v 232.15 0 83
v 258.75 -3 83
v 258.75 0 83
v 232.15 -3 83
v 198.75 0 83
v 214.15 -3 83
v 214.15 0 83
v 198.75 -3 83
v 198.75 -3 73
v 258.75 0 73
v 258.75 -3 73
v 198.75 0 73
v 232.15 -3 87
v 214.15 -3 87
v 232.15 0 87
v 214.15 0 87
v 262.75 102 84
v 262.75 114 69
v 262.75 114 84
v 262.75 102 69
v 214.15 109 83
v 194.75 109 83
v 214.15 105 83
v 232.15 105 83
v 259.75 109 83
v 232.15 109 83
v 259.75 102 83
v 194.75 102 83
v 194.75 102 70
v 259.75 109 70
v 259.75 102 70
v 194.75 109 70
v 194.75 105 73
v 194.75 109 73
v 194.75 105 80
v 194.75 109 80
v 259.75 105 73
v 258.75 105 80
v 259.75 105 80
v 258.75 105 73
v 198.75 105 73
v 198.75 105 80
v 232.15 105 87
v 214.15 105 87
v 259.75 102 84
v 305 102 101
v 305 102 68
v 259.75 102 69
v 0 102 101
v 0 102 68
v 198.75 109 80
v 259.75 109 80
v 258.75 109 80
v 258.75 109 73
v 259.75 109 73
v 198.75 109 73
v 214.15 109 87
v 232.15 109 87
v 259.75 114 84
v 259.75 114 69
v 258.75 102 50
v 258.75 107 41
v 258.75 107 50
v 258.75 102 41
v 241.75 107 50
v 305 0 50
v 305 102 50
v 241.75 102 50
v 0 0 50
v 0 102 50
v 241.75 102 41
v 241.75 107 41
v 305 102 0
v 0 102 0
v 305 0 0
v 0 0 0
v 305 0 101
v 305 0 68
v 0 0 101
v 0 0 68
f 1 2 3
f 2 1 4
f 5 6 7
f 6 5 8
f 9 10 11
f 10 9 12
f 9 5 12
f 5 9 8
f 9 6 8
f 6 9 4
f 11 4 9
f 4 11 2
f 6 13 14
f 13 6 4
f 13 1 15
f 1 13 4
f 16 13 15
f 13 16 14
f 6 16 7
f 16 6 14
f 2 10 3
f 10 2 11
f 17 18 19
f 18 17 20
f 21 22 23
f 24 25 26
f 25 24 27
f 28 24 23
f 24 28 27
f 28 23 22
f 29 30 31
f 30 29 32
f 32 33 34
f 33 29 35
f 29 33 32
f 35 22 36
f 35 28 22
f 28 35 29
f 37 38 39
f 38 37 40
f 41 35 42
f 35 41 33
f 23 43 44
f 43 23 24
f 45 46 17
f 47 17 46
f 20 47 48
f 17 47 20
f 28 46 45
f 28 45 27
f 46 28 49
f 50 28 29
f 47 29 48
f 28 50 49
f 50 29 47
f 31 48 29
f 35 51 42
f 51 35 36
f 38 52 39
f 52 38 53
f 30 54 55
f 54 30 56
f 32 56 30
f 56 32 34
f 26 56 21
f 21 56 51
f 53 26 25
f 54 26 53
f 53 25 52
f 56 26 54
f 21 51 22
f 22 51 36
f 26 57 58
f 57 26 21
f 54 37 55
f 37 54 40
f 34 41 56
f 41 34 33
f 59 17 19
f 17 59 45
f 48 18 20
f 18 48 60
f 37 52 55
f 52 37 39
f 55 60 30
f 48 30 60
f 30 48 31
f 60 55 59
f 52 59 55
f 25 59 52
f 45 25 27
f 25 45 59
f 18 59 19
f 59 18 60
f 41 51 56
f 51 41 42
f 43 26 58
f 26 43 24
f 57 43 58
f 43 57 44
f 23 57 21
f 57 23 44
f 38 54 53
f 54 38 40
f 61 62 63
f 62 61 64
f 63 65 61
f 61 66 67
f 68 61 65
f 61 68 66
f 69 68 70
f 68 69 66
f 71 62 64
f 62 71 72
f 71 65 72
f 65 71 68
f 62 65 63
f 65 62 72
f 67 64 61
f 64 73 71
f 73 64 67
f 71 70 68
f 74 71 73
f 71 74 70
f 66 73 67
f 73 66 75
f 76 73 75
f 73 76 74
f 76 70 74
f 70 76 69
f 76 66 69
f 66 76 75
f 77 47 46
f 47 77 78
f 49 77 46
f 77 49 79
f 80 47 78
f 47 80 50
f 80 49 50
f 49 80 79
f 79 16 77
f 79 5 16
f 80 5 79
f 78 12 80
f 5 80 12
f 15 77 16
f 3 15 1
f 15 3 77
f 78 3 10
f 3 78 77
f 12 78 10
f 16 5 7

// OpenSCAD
// 05_slide_to_lock_bar.scad
// Slide-to-lock cross-bar: a short flat bar lives in a guide channel on the
// FRONT long face of the upper tray. Sliding it +X causes its hook-tab to
// drop into a mortise slot in the lower tray wall, capturing the upper tray
// both vertically (no lift) and laterally (no pull-apart).
// A fixed stop ear on the channel prevents over-travel.
// Two bars (front + back) for symmetric grip.
//
// Engage: push bar +X until hook-tab seats in mortise (tactile stop).
// Release: push bar -X to retract hook, then lift upper tray.

explode = 18; // 0=engaged, 18=exploded

lx = 305; ly = 102; lz_lo = 50; lz_hi = 33;
wall = 3;

color_lo  = [0.35, 0.55, 0.80, 1];
color_hi  = [0.55, 0.78, 0.95, 1];
color_bar = [0.22, 0.72, 0.42, 1];   // bar – green
color_ch  = [0.18, 0.50, 0.32, 1];   // channel – dark green
color_mort= [0.55, 0.35, 0.70, 1];   // mortise block – purple

module lower_tray() { color(color_lo) cube([lx, ly, lz_lo]); }
module upper_tray() {
    color(color_hi) translate([0, 0, lz_lo + explode]) cube([lx, ly, lz_hi]);
}

// ── Parameters ────────────────────────────────────────────────────────────────
bar_l    = 60;    // bar total X length
bar_h    = 10;    // bar height Z
bar_t    = 4;     // bar thickness Y (depth into face)

hook_w   = 16;    // hook section X width
hook_drop= 7;     // hook drops DOWN by this amount into mortise
hook_t   = bar_t; // same thickness

ch_wt    = 3;     // channel wall/rail thickness
ch_extra = 4;     // channel extends past bar each side

travel   = (explode == 0) ? hook_w : 0; // bar shift when locked

mort_w   = hook_w + 1.0;
mort_h   = hook_drop + 2;
mort_t   = ch_wt + 2;

// Bar centred at 1/4 of lx from +X end (near right short wall)
bar_cx   = lx * 3/4 - bar_l / 2;  // nominal start X when unlocked

// ── Channel (mounted on outside of upper tray face) ───────────────────────────
module bar_channel(sy) {
    y_sign = (sy == 0) ? -1 : 1;
    uz = lz_lo + explode;
    x0 = bar_cx - ch_extra;
    cl = bar_l + ch_extra * 2;

    color(color_ch) {
        // Back plate
        translate([x0, sy, uz + 2])
            cube([cl, y_sign * ch_wt, bar_h + ch_wt]);
        // Top retaining rail
        translate([x0, sy + y_sign * ch_wt, uz + bar_h + 2])
            cube([cl, y_sign * (ch_wt + 1), ch_wt]);
        // Bottom retaining rail
        translate([x0, sy + y_sign * ch_wt, uz + 2])
            cube([cl, y_sign * (ch_wt + 1), ch_wt]);
        // Fixed stop ear at +X end (prevents over-travel)
        translate([x0 + cl - ch_wt, sy, uz + 2 - 1])
            cube([ch_wt, y_sign * (ch_wt * 2 + bar_t + 2), bar_h + ch_wt + 2]);
    }
}

// ── Mortise block on lower tray face (visual — represents slot in wall) ───────
module mortise_block(sy) {
    y_sign = (sy == 0) ? -1 : 1;
    // Mortise is at the +X end of bar travel, at the mating face level
    mx = bar_cx + bar_l - mort_w;
    color(color_mort)
    translate([mx, sy, lz_lo - mort_h])
        cube([mort_w, y_sign * mort_t, mort_h]);
}

// ── Sliding bar ───────────────────────────────────────────────────────────────
module slide_bar(sy) {
    y_sign = (sy == 0) ? -1 : 1;
    uz = lz_lo + explode;
    bx = bar_cx + travel;

    color(color_bar) {
        // Main bar body
        translate([bx, sy + y_sign * ch_wt, uz + 2 + ch_wt])
            cube([bar_l - hook_w, bar_t, bar_h]);

        // Thumb push tab (raised ridge on bar top)
        translate([bx + (bar_l - hook_w) * 0.35, sy + y_sign * ch_wt, uz + 2 + ch_wt + bar_h])
            cube([18, bar_t, 4]);

        // Hook-tab at +X end: protrudes DOWN when bar is pushed locked
        // When exploded (unlocked) it sits level; drop is shown in locked state
        hook_dz = (explode == 0) ? -hook_drop : 0;
        translate([bx + bar_l - hook_w, sy + y_sign * ch_wt, uz + 2 + ch_wt + hook_dz])
            cube([hook_w, bar_t, bar_h]);
    }
}

// ── Assembly ──────────────────────────────────────────────────────────────────
lower_tray();
upper_tray();

for (sy = [0, ly]) {
    bar_channel(sy);
    mortise_block(sy);
    slide_bar(sy);
}
